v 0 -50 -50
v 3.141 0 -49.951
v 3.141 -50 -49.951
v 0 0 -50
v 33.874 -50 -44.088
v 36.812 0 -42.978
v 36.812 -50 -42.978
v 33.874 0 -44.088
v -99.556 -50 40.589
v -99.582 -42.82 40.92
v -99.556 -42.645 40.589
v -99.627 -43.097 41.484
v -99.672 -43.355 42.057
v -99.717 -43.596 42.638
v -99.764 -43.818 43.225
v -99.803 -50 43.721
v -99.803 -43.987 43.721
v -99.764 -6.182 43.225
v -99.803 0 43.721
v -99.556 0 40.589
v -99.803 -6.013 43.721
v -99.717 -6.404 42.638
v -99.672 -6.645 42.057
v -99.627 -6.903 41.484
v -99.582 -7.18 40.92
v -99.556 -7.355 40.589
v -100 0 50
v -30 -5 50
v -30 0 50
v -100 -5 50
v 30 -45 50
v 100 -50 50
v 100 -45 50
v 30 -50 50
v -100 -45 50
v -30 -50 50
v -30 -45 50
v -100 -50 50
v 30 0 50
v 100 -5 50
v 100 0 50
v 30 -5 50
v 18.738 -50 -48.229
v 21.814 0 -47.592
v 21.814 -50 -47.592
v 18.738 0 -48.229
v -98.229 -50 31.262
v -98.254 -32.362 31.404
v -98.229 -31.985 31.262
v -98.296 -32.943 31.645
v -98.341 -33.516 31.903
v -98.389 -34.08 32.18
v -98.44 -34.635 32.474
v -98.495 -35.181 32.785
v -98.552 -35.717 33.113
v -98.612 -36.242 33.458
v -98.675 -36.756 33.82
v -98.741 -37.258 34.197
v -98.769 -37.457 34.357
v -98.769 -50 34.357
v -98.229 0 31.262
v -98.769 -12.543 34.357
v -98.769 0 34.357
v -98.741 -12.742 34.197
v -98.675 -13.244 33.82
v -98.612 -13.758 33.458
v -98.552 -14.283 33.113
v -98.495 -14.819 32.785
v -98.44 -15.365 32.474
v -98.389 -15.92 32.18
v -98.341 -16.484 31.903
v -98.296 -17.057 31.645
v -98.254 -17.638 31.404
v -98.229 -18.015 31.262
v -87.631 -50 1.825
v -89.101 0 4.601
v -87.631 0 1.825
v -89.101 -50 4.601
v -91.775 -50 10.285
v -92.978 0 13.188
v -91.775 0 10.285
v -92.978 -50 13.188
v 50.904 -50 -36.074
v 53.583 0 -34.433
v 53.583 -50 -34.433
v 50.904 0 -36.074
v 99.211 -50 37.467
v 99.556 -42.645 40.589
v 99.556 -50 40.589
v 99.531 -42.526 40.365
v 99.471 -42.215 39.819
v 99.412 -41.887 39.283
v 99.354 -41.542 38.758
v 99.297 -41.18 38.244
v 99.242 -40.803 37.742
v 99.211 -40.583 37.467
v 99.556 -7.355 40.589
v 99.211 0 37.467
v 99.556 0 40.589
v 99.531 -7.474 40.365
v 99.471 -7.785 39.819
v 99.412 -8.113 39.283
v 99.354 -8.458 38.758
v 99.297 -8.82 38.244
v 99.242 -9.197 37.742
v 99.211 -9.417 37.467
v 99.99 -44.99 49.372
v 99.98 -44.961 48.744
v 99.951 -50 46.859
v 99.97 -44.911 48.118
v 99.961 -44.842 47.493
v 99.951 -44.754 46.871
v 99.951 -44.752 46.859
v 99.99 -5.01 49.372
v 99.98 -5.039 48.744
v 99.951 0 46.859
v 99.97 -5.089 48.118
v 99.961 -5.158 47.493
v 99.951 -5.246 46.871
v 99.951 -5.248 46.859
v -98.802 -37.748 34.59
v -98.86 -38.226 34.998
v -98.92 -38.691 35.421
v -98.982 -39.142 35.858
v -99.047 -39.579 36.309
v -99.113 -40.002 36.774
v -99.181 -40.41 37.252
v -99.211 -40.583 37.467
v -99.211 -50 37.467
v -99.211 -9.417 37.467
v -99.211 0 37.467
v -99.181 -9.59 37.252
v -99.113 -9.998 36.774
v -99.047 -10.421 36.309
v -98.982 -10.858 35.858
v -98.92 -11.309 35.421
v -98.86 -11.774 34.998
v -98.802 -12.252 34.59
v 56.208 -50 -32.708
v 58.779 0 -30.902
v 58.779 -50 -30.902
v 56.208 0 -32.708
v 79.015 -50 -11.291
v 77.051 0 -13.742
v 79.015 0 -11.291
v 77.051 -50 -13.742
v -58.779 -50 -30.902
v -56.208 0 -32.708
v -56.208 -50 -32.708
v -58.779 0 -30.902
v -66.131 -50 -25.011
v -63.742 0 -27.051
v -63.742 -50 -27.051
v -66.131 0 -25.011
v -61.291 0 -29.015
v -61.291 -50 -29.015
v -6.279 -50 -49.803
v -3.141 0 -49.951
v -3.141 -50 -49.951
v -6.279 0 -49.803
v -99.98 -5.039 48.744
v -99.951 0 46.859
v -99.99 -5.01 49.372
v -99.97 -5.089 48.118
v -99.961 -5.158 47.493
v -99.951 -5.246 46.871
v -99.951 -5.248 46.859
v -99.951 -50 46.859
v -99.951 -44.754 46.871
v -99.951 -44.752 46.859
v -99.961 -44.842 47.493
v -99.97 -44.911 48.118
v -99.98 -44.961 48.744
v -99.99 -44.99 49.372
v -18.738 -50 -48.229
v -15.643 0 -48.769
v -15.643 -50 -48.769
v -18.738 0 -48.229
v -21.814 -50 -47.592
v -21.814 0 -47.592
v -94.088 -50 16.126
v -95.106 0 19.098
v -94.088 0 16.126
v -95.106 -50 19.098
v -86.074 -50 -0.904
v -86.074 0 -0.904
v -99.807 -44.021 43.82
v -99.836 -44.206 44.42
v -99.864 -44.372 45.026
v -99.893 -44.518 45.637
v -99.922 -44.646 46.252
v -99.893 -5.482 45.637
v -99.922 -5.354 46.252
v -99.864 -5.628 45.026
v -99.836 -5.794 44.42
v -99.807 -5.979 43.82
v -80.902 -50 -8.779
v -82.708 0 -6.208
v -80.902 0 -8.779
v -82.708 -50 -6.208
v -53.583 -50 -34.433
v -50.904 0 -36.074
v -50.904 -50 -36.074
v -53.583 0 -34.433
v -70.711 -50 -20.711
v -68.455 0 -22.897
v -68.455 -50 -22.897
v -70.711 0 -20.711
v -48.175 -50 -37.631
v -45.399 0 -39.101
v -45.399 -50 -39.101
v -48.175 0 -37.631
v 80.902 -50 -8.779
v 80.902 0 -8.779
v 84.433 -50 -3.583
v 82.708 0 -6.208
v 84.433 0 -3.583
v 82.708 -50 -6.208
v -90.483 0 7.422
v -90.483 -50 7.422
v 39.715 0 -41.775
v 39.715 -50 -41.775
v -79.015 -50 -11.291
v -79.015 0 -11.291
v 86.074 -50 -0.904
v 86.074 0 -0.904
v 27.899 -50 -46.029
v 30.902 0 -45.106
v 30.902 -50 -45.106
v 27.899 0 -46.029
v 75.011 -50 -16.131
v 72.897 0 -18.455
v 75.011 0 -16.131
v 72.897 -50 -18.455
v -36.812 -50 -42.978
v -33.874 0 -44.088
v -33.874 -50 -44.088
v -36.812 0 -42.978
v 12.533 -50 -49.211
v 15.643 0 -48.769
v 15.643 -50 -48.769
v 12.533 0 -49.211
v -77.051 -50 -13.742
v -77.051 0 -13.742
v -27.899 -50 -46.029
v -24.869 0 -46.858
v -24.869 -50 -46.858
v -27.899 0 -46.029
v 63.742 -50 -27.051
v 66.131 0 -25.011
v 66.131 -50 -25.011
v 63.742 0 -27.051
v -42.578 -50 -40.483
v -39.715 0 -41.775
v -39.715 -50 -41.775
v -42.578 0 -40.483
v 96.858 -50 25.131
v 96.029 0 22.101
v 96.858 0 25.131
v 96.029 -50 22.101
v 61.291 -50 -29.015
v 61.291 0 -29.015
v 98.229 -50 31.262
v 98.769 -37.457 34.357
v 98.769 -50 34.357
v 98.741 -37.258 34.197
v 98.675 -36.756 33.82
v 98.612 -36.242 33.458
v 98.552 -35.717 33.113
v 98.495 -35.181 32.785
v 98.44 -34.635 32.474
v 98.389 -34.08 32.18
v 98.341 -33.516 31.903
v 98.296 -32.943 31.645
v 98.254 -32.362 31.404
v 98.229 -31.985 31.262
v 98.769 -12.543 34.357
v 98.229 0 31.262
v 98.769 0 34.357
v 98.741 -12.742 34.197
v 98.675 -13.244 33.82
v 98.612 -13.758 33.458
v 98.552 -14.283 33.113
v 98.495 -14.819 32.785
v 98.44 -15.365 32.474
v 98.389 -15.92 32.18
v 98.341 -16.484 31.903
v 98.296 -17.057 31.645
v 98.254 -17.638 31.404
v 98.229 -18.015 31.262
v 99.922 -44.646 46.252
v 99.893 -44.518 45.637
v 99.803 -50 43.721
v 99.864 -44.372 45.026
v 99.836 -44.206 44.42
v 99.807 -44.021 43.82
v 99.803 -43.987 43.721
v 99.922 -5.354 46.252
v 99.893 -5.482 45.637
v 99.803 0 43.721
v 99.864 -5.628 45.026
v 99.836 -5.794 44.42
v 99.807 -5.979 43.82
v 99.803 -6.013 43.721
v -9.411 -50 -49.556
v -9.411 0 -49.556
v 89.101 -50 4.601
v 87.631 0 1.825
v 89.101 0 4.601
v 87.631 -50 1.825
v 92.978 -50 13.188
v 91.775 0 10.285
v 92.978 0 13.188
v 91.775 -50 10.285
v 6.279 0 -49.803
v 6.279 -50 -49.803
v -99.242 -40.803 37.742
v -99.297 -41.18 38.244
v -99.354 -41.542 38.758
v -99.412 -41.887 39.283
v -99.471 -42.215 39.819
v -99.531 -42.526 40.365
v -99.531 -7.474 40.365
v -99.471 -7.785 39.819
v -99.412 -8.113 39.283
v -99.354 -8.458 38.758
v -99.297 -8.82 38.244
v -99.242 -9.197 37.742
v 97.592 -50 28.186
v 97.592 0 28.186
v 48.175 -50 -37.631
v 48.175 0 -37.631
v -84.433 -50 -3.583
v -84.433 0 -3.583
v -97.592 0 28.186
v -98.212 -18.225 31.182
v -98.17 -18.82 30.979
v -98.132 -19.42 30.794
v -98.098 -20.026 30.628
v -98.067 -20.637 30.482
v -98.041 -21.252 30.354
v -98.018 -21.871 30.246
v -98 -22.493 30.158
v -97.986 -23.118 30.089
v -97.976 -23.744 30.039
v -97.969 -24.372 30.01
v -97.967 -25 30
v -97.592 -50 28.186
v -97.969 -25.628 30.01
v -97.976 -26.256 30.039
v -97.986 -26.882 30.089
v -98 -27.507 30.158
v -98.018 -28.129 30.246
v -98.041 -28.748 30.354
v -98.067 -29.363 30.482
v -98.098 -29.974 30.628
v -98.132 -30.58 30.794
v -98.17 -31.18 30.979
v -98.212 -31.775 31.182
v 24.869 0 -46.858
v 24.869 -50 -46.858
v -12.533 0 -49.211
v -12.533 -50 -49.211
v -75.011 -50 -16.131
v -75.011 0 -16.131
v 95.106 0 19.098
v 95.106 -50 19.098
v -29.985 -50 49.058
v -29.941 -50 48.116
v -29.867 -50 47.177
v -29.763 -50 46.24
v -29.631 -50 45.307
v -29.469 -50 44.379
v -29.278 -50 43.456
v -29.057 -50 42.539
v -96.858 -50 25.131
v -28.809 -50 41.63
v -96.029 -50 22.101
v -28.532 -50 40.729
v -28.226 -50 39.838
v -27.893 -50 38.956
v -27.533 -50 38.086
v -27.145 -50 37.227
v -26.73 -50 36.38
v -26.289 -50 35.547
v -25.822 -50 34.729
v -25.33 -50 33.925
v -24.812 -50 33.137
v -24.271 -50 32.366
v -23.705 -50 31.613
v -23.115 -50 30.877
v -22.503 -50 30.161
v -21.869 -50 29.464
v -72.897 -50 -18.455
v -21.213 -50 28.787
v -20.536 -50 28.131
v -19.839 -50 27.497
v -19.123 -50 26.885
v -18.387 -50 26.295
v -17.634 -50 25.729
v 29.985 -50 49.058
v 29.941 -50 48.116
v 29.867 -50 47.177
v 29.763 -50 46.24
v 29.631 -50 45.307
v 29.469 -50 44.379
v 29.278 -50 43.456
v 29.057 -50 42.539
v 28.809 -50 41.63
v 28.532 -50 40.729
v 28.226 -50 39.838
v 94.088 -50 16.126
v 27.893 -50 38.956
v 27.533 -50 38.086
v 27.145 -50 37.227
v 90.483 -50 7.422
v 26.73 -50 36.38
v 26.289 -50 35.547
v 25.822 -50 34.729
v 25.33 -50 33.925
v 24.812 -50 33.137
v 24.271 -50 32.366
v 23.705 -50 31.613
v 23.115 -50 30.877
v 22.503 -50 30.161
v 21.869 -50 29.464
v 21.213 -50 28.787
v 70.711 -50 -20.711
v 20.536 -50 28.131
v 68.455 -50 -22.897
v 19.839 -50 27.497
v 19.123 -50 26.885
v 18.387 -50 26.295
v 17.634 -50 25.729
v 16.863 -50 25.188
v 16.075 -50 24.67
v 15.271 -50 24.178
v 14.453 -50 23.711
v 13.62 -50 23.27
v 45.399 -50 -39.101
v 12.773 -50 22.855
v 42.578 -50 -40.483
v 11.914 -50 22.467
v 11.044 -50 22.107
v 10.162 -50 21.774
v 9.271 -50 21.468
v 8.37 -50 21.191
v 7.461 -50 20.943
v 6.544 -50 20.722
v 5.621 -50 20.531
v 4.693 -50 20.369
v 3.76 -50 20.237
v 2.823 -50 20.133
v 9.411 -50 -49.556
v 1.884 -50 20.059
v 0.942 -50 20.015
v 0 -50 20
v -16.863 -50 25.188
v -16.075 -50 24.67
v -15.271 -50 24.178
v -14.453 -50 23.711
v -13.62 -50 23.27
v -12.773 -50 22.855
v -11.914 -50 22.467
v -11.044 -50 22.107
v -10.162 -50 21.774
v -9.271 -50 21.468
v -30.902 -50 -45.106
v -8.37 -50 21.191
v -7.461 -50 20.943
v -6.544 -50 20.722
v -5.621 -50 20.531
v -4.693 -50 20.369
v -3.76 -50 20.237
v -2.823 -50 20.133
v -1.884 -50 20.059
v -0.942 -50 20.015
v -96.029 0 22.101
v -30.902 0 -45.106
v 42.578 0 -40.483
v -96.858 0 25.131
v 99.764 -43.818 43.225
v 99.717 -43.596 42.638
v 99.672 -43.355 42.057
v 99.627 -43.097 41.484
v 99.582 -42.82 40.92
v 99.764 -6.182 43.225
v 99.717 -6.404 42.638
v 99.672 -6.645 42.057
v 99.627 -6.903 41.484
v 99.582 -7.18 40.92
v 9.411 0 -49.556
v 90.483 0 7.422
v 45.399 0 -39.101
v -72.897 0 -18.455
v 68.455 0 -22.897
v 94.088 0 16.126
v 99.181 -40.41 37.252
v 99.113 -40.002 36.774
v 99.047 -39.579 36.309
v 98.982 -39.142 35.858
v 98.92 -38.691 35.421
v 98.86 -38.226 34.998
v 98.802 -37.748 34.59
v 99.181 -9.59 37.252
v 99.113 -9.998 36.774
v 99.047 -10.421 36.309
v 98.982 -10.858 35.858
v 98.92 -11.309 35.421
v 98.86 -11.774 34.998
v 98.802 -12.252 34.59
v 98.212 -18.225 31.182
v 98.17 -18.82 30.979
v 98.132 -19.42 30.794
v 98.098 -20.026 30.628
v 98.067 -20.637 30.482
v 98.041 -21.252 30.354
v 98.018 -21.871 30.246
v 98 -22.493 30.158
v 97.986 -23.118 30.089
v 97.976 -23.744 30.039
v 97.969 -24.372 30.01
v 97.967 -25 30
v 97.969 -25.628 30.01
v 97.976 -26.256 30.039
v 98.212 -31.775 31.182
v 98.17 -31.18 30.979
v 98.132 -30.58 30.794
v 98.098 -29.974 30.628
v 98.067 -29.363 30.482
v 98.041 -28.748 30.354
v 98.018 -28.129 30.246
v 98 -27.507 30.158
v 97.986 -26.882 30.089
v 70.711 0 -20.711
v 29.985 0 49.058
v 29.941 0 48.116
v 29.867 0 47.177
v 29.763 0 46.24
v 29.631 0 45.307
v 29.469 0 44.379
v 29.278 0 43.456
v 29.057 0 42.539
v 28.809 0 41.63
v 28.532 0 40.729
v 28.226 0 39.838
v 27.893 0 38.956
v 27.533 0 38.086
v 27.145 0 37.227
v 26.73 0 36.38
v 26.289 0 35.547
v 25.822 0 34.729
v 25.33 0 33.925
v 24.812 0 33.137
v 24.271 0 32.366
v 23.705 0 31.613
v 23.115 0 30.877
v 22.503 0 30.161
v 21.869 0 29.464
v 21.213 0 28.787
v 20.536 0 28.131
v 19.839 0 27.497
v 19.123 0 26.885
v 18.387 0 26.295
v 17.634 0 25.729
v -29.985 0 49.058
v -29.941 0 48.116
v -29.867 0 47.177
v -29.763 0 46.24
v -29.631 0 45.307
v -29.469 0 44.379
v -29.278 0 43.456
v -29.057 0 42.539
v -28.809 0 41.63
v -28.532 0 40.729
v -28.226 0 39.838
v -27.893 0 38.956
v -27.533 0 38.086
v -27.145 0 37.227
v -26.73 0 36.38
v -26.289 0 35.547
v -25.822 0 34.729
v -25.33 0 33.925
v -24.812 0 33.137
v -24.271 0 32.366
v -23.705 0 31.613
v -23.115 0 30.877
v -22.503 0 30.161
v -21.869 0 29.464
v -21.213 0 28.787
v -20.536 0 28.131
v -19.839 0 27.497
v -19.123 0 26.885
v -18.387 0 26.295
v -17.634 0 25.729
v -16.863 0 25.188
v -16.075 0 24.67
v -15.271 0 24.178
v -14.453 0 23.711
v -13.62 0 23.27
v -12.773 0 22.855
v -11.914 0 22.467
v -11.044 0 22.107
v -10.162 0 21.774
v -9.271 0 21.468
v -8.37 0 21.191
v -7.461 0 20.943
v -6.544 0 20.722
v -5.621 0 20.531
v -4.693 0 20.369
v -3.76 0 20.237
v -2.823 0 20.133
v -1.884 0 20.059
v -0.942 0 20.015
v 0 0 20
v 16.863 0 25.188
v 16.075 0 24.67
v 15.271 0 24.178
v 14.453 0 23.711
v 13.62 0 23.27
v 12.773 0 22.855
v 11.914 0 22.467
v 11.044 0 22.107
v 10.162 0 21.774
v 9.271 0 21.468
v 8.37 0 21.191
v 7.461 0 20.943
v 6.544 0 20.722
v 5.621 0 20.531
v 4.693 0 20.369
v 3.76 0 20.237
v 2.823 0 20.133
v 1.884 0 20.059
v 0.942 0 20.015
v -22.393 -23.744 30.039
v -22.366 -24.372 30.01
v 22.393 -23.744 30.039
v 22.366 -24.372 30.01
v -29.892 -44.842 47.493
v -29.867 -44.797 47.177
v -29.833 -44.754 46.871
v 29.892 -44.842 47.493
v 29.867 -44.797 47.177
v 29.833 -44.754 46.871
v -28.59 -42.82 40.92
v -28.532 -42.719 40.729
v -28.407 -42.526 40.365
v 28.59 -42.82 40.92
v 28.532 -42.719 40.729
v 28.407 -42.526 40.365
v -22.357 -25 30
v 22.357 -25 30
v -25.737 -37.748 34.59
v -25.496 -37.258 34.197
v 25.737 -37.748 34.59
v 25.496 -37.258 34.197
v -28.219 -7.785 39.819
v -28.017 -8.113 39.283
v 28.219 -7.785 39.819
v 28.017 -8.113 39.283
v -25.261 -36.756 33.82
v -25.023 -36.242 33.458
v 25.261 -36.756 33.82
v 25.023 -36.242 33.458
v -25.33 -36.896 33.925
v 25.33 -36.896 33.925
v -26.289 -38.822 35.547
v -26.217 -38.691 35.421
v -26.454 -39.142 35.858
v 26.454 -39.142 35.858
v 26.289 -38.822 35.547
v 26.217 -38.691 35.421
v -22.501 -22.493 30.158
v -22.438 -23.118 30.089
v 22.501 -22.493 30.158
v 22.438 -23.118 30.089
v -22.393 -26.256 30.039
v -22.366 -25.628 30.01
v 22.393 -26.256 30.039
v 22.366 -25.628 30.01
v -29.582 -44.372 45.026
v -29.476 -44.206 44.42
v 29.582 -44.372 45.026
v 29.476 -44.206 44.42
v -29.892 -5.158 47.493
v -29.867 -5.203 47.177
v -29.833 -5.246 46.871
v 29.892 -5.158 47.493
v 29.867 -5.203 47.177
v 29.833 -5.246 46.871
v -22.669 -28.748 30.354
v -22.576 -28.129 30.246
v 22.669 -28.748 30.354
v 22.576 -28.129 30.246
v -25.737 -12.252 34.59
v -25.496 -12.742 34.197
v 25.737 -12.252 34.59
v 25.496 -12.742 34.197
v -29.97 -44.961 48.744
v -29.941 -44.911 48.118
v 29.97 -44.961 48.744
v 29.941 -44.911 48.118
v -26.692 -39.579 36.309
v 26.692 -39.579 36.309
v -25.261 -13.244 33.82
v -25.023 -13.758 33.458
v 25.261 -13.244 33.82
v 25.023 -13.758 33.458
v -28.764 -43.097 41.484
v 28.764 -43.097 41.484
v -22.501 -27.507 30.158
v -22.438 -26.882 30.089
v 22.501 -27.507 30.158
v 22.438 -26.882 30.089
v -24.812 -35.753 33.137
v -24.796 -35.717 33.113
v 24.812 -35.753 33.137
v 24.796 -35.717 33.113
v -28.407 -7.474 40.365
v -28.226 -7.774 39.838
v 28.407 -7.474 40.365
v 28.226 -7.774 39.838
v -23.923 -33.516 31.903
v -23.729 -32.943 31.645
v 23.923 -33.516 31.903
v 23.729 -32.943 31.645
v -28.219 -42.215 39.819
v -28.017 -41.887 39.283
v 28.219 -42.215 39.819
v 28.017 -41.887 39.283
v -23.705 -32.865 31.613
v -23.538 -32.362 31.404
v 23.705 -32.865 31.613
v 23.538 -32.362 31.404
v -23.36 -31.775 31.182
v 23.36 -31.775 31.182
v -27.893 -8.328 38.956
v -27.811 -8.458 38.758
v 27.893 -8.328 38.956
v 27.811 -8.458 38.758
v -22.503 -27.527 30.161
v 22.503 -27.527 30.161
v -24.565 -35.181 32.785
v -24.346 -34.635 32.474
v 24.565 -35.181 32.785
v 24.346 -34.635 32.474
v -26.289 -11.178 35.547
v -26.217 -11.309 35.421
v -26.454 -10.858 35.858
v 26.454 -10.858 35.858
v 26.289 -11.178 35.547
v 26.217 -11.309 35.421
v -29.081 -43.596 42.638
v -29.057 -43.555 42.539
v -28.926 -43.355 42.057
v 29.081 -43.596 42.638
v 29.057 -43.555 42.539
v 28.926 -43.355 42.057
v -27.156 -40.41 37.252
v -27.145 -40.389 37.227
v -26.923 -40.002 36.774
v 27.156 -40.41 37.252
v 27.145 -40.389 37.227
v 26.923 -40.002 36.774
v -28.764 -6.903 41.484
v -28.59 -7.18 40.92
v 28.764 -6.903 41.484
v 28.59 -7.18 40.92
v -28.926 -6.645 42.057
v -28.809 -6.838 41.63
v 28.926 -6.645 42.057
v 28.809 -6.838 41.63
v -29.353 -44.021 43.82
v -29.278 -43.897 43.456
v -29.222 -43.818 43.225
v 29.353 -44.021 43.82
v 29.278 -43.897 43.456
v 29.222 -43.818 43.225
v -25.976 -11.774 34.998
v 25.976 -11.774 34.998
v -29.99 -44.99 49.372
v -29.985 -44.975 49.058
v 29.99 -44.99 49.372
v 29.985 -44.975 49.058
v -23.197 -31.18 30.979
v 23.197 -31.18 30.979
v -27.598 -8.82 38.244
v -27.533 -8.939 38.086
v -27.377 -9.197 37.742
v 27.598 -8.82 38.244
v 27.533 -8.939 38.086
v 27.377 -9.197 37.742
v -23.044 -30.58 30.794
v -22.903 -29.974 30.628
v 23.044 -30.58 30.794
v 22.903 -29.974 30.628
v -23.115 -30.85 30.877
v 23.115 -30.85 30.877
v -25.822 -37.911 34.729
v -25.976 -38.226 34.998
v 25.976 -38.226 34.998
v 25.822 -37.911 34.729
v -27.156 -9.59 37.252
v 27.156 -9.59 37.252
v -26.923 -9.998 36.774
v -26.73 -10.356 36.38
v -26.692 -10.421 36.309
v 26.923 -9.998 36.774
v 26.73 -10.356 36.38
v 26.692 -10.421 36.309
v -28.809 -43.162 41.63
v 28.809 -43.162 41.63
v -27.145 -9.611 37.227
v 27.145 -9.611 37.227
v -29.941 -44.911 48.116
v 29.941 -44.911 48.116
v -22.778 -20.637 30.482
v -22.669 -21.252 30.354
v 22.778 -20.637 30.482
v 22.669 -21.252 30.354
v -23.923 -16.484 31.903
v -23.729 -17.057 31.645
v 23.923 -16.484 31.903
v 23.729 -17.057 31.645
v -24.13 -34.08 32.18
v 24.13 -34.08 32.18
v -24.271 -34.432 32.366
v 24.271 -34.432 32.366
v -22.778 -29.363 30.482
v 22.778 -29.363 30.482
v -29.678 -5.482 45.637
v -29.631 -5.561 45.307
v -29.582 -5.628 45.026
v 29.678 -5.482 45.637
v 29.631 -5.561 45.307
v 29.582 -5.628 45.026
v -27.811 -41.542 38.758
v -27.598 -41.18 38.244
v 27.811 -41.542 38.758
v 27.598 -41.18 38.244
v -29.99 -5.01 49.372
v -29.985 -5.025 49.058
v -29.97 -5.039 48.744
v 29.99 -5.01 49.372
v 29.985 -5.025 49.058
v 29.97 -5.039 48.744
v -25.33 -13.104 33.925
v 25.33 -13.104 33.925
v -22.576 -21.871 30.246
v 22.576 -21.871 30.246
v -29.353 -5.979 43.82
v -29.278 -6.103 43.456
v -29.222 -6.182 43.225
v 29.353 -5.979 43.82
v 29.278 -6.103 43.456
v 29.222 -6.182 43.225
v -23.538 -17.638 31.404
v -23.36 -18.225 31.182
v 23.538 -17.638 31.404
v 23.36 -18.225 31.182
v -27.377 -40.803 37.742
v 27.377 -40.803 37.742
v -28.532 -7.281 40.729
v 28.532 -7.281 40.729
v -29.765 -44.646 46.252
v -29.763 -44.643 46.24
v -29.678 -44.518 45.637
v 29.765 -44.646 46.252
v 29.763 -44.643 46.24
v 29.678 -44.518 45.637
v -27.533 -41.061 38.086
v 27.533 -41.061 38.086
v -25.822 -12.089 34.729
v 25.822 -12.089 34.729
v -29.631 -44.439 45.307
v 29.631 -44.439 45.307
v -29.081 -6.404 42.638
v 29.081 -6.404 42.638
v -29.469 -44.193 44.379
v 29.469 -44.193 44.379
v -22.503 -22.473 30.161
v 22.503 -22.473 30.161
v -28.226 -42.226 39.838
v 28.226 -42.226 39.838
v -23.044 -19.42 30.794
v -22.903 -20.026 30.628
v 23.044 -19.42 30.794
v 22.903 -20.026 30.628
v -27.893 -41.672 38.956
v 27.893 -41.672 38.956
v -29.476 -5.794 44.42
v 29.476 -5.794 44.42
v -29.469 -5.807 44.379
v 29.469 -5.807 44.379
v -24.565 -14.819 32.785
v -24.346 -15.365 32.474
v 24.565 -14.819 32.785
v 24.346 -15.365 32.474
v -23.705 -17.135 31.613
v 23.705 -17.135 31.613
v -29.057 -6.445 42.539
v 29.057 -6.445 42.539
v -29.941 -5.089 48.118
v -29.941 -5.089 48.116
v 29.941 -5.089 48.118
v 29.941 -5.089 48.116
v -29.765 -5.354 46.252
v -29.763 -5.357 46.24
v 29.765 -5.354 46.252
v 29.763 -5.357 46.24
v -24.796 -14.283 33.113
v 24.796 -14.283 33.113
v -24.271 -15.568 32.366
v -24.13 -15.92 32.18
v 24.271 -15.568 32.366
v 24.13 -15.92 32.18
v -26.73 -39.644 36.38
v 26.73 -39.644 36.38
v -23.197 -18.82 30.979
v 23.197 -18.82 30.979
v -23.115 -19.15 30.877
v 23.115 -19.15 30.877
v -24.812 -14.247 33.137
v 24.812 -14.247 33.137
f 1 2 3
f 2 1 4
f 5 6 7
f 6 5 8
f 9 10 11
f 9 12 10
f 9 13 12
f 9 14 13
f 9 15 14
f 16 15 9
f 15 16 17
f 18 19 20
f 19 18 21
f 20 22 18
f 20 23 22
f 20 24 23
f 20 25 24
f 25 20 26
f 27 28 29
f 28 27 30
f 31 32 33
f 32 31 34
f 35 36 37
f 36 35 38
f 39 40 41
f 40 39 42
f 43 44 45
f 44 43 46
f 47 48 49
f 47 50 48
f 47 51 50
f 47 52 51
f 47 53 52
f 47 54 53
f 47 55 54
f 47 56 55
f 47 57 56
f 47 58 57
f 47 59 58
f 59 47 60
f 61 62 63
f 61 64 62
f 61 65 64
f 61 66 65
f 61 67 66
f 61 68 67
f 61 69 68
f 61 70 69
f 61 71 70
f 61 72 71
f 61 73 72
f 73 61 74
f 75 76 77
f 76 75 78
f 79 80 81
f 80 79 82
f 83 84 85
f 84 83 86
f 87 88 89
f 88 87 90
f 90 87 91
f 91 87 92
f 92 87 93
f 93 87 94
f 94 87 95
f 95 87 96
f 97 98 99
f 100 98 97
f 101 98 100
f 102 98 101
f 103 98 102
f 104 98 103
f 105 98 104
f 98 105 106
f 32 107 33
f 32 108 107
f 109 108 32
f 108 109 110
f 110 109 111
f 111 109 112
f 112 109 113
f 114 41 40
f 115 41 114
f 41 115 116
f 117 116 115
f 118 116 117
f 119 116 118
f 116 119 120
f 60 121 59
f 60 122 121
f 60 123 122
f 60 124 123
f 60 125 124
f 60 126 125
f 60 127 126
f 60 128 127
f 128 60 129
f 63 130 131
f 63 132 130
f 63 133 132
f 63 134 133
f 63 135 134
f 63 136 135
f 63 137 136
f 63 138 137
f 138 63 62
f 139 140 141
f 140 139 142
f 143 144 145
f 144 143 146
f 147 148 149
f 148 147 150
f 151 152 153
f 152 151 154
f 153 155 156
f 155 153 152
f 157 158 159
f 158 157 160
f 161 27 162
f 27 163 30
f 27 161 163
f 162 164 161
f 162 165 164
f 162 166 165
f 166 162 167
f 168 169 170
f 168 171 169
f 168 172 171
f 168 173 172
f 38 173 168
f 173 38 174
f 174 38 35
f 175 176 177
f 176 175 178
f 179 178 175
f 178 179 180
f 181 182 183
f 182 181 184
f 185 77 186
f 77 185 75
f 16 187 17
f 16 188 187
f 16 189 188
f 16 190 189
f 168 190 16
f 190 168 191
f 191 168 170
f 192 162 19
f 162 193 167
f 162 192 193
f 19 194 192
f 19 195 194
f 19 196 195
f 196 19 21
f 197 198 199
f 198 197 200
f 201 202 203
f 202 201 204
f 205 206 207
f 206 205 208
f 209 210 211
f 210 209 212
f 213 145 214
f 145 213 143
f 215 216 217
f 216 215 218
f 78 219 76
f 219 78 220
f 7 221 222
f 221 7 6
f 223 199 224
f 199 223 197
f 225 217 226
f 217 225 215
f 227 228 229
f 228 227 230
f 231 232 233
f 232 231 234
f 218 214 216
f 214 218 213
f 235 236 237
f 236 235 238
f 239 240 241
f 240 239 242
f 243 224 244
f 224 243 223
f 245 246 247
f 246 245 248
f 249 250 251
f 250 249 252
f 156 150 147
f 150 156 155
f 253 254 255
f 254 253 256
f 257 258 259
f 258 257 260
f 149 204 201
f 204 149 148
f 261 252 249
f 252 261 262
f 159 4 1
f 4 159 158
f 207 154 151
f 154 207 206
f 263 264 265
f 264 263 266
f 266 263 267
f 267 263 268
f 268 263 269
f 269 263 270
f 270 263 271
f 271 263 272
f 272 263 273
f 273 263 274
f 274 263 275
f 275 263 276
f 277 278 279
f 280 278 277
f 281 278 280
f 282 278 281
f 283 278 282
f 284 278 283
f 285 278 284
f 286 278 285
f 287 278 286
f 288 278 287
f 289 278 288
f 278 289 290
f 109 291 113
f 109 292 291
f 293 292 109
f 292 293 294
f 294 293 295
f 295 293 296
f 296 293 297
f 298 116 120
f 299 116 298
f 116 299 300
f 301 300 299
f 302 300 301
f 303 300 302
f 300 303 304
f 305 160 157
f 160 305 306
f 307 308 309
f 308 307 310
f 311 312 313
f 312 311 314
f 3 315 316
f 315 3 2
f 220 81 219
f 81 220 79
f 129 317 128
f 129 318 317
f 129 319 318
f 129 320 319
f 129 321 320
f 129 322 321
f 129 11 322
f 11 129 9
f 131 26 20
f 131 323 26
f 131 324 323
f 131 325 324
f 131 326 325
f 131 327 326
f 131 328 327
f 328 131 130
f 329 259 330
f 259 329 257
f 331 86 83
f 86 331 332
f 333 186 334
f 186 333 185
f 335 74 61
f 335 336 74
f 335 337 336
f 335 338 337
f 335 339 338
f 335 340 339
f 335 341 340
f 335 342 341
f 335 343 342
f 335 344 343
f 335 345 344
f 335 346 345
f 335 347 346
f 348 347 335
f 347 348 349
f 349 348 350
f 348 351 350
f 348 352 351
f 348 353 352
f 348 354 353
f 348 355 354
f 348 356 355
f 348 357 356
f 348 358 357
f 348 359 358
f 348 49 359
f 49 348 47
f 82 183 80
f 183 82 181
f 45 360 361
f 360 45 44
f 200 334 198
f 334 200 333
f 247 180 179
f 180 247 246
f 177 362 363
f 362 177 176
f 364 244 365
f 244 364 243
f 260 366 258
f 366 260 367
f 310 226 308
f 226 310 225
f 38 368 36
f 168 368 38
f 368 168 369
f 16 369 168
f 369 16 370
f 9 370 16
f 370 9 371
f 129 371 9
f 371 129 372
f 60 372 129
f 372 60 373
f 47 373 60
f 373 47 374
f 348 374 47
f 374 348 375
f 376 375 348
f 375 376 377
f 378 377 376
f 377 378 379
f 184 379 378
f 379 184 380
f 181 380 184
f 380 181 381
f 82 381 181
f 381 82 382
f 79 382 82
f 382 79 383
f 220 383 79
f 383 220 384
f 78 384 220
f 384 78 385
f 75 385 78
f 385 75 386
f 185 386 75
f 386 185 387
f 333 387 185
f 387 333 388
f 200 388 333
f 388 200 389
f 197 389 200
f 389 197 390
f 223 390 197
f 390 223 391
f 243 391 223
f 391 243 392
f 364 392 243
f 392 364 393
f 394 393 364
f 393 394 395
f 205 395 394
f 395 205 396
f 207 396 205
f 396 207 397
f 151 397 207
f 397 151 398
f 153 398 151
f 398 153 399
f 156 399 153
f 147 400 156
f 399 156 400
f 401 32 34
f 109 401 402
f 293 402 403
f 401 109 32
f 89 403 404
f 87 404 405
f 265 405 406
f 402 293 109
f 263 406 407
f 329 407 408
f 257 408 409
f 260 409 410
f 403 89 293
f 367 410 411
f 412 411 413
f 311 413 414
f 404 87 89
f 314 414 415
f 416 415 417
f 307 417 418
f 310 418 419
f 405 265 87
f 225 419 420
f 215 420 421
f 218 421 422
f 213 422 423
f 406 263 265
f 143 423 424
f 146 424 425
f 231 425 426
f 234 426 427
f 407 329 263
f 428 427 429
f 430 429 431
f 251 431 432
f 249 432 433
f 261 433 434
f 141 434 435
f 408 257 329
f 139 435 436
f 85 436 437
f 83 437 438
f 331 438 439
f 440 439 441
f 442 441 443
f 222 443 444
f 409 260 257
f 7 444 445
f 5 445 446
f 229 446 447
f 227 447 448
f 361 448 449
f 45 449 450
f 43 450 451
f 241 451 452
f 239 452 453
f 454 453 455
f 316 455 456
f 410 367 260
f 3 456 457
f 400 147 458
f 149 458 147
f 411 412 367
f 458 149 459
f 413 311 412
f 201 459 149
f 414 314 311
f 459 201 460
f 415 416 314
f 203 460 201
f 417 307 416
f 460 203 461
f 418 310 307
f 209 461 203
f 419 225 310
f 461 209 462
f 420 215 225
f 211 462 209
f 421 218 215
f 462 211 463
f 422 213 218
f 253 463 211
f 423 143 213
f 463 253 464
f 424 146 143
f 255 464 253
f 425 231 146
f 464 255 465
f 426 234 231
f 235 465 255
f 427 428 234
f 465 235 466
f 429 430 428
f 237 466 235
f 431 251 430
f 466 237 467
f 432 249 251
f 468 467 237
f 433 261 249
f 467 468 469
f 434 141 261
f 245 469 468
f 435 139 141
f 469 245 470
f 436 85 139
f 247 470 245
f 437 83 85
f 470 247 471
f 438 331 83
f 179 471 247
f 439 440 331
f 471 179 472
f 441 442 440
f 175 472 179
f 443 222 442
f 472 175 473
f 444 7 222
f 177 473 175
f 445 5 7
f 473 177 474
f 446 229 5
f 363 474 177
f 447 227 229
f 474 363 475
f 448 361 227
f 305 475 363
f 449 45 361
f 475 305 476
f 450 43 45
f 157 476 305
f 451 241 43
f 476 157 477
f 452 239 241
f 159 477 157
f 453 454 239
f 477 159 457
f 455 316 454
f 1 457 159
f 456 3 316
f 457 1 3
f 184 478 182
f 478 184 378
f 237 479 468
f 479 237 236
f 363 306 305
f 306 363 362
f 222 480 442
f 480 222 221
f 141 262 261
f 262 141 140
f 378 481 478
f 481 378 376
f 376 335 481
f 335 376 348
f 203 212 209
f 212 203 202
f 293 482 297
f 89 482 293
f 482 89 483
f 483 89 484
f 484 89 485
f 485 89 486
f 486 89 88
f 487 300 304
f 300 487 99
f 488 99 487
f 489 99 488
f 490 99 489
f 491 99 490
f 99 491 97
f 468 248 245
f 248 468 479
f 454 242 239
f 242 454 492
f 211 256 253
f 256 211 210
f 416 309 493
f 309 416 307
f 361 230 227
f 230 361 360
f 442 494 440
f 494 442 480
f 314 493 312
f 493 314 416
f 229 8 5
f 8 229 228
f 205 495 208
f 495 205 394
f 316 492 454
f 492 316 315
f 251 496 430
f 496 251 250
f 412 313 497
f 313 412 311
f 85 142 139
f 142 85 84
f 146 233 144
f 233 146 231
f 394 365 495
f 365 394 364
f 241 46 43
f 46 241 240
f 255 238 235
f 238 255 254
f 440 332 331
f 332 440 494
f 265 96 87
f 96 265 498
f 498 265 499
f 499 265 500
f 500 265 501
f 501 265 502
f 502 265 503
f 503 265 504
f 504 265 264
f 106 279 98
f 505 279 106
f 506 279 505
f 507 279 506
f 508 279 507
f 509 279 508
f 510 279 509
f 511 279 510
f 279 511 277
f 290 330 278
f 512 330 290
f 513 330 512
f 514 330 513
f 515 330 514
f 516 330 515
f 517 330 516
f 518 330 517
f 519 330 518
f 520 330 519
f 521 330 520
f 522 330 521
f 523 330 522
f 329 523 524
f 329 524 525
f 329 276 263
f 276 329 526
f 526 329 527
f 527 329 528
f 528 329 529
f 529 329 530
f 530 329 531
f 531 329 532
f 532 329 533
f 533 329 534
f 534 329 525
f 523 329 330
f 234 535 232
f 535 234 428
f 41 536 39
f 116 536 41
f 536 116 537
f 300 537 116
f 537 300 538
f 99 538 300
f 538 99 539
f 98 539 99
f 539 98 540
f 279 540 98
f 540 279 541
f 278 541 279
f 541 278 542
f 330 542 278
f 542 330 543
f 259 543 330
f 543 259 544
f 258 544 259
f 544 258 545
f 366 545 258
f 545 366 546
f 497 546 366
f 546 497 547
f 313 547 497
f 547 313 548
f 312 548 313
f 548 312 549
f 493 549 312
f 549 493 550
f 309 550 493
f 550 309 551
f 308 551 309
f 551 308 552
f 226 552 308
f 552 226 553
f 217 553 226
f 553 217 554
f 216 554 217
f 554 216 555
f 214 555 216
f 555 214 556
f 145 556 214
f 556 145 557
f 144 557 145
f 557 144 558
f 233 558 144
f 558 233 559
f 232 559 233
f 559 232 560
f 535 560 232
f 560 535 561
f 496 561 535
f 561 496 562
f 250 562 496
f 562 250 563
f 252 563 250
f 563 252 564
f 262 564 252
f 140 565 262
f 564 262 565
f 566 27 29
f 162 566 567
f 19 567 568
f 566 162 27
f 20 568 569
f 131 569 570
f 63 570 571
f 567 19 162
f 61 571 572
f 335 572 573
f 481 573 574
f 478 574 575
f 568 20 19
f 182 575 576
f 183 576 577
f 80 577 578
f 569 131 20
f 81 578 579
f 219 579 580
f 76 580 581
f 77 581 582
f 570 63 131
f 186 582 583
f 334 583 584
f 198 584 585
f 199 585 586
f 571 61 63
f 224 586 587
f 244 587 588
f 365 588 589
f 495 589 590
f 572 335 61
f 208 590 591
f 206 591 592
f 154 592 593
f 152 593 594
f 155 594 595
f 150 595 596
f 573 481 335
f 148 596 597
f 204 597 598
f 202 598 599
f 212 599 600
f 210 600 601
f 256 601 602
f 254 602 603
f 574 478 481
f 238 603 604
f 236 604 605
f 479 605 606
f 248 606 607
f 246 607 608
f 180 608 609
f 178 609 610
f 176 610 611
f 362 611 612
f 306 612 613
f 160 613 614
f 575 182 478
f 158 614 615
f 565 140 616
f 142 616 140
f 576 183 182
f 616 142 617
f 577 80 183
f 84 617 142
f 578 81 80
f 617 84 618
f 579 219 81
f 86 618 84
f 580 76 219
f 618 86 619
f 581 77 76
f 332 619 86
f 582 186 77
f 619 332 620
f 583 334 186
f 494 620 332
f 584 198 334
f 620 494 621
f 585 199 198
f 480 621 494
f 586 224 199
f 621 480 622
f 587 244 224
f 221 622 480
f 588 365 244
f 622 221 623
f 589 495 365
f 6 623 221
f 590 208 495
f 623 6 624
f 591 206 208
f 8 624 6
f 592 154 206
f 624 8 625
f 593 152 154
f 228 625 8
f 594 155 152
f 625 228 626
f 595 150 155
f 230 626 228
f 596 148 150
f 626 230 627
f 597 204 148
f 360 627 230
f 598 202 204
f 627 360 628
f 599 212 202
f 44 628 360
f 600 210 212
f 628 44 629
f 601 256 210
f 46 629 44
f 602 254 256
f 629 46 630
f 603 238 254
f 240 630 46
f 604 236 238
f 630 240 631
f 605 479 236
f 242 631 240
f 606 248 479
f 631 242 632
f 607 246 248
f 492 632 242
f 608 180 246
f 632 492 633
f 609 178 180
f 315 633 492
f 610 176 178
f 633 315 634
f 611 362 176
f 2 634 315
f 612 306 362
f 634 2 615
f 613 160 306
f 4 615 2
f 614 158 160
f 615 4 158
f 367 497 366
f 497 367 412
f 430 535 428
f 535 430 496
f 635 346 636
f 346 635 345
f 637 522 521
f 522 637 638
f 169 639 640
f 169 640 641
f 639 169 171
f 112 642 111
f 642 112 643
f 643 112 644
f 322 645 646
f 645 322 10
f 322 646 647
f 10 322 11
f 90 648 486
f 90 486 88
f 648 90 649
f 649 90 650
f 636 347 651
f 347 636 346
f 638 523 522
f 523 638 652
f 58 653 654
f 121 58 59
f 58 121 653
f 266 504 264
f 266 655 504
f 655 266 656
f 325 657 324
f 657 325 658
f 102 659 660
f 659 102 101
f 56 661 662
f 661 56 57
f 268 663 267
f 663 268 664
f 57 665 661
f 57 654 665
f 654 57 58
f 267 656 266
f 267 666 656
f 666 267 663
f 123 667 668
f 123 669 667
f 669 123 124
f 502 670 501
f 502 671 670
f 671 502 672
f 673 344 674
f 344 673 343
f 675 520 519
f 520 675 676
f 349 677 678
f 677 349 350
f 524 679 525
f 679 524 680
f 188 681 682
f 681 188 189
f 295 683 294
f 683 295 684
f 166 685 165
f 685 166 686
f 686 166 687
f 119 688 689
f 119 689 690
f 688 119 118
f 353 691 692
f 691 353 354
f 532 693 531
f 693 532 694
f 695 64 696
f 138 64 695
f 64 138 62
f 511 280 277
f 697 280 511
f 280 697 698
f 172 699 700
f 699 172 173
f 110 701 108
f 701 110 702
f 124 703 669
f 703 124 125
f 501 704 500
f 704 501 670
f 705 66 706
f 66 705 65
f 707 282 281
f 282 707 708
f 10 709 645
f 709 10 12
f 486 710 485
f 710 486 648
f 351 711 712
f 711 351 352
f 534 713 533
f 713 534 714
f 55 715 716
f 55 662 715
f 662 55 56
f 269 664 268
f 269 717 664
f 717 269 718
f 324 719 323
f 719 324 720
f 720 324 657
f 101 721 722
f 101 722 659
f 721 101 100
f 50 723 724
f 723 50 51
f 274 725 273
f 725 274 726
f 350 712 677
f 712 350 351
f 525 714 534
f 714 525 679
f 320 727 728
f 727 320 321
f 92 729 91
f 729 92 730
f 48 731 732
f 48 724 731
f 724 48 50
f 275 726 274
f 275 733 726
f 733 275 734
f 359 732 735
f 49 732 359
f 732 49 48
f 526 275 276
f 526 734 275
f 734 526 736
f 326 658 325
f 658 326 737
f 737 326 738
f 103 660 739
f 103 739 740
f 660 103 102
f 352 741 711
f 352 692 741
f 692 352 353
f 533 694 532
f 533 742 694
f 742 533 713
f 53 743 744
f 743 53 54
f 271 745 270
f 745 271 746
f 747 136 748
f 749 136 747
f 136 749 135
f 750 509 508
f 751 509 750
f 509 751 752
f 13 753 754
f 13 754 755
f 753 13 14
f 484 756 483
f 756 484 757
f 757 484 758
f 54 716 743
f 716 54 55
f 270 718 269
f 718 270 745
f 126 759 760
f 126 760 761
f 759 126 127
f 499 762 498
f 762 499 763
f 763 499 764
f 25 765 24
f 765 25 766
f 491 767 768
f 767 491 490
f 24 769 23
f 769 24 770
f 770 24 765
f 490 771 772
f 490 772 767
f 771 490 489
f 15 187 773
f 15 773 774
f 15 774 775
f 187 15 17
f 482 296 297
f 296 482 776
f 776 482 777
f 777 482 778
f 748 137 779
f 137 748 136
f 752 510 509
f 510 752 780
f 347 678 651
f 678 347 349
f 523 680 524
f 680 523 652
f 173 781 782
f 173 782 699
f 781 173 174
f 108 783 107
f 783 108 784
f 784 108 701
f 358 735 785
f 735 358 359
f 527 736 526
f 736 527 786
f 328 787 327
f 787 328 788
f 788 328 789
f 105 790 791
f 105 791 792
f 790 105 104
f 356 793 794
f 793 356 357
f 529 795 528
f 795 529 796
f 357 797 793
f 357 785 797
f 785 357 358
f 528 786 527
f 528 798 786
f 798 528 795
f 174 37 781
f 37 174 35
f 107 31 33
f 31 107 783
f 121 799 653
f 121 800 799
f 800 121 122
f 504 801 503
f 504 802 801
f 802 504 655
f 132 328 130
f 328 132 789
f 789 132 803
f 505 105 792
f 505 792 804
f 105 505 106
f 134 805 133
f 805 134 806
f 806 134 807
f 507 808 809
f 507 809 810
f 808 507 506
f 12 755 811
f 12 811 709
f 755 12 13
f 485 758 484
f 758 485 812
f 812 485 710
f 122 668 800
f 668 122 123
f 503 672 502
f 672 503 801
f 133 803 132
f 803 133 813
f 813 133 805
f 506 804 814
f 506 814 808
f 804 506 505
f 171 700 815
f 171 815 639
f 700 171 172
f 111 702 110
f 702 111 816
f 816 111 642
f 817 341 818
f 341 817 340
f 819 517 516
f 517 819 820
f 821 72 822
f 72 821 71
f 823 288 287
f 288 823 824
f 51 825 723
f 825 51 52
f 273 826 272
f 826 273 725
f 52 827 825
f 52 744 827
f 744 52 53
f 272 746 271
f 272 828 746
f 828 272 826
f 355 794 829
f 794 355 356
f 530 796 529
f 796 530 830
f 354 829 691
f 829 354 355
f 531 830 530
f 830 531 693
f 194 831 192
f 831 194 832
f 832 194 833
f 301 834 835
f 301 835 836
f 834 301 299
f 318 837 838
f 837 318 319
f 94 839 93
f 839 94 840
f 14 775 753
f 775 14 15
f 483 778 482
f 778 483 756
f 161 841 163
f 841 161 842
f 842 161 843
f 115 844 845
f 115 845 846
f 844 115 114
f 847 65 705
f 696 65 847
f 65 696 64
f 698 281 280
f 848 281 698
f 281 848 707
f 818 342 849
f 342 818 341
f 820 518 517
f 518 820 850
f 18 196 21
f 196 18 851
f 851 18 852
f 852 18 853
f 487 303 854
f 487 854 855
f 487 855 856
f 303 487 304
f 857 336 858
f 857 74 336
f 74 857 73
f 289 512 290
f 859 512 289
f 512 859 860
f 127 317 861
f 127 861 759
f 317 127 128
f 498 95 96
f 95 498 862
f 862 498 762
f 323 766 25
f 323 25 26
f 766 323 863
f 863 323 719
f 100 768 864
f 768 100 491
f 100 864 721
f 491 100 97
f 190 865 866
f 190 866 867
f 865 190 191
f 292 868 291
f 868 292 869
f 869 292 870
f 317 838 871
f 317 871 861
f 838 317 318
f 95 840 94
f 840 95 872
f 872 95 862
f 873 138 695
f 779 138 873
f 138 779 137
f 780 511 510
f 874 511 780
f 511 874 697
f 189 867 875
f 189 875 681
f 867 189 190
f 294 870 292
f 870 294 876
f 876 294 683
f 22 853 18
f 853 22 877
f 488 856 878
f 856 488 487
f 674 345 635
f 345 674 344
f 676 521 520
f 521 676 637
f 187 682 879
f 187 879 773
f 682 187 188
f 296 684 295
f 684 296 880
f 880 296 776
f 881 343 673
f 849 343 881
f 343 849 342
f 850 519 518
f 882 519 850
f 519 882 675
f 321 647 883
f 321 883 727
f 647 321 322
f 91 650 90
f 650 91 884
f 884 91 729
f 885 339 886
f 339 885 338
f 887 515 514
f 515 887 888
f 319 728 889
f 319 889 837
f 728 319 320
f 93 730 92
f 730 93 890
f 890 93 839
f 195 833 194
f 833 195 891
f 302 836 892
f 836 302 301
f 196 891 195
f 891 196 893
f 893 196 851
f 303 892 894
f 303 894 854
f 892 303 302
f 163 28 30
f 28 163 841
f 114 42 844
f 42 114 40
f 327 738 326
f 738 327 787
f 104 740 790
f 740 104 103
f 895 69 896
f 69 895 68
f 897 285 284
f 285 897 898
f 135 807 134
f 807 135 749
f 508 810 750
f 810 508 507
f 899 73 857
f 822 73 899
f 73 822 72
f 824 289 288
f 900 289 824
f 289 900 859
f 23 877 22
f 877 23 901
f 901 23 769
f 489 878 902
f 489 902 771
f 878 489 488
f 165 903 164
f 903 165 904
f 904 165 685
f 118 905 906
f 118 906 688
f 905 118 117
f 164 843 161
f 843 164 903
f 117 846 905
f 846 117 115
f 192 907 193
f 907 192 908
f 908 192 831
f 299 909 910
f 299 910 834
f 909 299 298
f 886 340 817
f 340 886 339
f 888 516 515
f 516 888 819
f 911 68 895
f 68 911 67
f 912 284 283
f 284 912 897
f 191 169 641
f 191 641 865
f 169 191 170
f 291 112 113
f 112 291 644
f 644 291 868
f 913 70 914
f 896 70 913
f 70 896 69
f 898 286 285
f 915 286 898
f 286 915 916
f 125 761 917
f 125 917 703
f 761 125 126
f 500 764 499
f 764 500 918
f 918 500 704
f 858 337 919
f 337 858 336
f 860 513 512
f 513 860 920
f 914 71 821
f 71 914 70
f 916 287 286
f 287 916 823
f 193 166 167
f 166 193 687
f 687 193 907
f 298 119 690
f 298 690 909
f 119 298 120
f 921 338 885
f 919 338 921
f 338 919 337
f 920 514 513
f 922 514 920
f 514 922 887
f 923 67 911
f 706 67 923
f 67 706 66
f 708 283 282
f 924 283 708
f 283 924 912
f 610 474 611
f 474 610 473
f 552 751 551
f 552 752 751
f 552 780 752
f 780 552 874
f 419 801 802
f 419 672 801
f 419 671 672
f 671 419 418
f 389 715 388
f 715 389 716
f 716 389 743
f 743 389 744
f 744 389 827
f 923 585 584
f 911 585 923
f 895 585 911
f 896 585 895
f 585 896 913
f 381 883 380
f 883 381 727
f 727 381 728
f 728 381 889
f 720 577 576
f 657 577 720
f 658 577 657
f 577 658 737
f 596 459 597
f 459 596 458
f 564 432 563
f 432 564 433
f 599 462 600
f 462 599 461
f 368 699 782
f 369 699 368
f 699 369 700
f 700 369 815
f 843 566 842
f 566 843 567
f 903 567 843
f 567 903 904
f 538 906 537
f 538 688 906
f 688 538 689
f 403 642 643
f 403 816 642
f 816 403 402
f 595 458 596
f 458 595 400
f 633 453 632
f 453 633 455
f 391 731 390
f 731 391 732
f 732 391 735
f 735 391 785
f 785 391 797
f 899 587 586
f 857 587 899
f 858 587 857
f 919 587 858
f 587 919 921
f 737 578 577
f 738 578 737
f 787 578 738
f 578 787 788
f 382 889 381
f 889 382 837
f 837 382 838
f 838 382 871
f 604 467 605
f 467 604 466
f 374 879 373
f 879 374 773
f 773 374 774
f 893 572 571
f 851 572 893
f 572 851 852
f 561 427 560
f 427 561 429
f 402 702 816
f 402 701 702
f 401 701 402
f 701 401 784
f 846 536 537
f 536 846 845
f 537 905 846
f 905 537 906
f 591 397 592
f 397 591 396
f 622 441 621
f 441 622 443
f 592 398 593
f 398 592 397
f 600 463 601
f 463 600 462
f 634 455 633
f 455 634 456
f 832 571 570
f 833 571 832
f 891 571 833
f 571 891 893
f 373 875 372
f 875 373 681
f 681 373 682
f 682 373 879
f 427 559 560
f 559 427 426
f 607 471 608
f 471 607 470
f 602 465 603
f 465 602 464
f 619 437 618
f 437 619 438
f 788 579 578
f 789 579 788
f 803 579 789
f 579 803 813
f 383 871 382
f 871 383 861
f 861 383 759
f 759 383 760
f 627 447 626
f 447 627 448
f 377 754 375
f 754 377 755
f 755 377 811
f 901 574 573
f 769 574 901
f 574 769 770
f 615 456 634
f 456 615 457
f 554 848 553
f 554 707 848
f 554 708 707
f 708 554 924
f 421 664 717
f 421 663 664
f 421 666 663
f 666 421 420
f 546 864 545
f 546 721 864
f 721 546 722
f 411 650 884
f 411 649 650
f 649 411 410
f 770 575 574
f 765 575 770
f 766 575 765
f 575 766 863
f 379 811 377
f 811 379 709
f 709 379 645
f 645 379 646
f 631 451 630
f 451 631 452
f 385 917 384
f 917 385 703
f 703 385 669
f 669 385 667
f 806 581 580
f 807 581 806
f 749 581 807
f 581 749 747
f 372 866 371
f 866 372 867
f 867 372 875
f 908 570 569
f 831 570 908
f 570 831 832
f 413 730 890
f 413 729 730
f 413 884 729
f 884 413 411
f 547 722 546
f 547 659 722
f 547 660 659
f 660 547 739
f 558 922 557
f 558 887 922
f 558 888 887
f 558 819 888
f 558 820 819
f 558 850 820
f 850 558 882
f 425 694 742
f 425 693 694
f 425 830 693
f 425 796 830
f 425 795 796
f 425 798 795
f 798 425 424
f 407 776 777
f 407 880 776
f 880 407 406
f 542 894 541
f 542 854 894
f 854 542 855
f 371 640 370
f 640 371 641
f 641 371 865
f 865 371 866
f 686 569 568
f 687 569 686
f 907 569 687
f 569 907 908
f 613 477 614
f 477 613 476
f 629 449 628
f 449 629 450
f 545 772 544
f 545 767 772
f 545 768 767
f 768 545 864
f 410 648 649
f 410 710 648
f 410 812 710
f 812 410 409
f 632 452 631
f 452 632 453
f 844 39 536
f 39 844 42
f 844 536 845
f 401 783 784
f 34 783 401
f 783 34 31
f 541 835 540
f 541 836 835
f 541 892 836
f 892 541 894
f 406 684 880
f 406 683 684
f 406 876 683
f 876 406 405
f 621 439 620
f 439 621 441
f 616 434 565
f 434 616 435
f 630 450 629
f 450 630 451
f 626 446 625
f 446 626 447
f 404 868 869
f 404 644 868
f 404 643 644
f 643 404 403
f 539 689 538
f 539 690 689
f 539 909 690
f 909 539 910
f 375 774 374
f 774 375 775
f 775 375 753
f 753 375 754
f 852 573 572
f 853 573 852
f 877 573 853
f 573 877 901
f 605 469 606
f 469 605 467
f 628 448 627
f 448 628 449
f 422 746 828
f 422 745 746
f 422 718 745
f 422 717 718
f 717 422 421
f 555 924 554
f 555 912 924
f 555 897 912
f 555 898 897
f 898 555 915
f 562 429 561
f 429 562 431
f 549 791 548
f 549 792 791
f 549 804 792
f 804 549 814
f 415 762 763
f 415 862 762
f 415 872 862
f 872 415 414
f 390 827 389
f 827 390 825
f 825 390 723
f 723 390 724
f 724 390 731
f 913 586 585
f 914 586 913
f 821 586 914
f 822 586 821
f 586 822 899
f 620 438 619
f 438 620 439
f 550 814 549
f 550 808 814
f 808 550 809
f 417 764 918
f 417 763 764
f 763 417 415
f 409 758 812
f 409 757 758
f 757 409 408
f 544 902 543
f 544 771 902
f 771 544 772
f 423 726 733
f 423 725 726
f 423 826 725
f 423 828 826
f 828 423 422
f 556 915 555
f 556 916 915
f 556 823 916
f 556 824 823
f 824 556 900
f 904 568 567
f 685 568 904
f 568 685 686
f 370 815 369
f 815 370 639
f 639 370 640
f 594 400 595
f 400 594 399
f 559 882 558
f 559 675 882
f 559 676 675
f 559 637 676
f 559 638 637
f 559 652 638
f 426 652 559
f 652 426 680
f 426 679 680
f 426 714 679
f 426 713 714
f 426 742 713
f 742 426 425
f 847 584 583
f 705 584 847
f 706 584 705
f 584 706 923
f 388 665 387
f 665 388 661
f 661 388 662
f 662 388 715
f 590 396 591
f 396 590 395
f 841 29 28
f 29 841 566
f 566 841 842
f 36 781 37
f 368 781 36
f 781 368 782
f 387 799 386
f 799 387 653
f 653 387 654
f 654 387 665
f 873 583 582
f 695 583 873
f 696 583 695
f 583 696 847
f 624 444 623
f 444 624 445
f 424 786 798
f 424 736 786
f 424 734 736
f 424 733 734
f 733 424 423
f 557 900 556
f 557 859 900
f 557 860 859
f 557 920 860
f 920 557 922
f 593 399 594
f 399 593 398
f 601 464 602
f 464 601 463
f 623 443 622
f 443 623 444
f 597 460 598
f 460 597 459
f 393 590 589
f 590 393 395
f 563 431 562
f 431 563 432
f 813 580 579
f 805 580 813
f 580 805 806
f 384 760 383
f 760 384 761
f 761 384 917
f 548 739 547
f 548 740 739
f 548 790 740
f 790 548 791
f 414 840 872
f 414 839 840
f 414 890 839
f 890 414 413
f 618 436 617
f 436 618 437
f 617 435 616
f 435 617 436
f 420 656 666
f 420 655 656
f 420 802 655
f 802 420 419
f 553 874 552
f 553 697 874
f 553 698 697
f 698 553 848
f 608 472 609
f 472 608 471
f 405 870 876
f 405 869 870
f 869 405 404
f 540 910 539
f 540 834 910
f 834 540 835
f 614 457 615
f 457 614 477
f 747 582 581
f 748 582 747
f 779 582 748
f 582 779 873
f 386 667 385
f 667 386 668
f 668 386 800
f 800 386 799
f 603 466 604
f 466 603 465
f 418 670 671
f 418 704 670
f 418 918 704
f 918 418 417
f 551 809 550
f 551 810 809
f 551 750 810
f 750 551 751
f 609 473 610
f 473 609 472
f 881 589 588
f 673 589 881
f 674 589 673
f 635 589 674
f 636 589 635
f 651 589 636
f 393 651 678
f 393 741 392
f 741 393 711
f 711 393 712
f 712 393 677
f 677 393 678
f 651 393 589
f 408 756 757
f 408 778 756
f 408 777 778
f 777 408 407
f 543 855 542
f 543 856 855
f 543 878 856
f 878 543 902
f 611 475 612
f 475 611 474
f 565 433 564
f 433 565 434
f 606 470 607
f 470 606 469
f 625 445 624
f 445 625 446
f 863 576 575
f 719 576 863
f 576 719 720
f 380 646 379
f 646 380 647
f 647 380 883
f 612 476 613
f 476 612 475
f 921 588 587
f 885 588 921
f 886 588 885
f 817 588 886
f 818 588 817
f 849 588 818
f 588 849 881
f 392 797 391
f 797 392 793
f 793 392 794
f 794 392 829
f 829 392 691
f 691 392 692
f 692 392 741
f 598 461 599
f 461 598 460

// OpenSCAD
//CUSTOMIZER VARIABLES

height = 100; // [50:200]
depth = 50; // [25:75]
dslot = 40; // [20:80]
fslot = 60; // [20:80]

//CUSTOMIZER VARIABLES END

$fn = 200;

width = height * 2;
radius = width / 2;

difference() {
	rotate(a = 90, v = [1, 0, 0])
		linear_extrude(depth)
			intersection() {
				square([width, height], true);
				translate([0, radius / 2])
					circle(radius);
			}
	translate([-width, -depth / 2, height / 2])
		rotate(a = 90, v = [0, 1, 0])
			linear_extrude(width * 4)
					circle(dslot / 2);
	rotate(a = 90, v = [1, 0, 0])
		translate([0, 0, -depth / 2])
			linear_extrude(depth * 2)
				translate([0, height / 2])
					circle(fslot / 2);
}
